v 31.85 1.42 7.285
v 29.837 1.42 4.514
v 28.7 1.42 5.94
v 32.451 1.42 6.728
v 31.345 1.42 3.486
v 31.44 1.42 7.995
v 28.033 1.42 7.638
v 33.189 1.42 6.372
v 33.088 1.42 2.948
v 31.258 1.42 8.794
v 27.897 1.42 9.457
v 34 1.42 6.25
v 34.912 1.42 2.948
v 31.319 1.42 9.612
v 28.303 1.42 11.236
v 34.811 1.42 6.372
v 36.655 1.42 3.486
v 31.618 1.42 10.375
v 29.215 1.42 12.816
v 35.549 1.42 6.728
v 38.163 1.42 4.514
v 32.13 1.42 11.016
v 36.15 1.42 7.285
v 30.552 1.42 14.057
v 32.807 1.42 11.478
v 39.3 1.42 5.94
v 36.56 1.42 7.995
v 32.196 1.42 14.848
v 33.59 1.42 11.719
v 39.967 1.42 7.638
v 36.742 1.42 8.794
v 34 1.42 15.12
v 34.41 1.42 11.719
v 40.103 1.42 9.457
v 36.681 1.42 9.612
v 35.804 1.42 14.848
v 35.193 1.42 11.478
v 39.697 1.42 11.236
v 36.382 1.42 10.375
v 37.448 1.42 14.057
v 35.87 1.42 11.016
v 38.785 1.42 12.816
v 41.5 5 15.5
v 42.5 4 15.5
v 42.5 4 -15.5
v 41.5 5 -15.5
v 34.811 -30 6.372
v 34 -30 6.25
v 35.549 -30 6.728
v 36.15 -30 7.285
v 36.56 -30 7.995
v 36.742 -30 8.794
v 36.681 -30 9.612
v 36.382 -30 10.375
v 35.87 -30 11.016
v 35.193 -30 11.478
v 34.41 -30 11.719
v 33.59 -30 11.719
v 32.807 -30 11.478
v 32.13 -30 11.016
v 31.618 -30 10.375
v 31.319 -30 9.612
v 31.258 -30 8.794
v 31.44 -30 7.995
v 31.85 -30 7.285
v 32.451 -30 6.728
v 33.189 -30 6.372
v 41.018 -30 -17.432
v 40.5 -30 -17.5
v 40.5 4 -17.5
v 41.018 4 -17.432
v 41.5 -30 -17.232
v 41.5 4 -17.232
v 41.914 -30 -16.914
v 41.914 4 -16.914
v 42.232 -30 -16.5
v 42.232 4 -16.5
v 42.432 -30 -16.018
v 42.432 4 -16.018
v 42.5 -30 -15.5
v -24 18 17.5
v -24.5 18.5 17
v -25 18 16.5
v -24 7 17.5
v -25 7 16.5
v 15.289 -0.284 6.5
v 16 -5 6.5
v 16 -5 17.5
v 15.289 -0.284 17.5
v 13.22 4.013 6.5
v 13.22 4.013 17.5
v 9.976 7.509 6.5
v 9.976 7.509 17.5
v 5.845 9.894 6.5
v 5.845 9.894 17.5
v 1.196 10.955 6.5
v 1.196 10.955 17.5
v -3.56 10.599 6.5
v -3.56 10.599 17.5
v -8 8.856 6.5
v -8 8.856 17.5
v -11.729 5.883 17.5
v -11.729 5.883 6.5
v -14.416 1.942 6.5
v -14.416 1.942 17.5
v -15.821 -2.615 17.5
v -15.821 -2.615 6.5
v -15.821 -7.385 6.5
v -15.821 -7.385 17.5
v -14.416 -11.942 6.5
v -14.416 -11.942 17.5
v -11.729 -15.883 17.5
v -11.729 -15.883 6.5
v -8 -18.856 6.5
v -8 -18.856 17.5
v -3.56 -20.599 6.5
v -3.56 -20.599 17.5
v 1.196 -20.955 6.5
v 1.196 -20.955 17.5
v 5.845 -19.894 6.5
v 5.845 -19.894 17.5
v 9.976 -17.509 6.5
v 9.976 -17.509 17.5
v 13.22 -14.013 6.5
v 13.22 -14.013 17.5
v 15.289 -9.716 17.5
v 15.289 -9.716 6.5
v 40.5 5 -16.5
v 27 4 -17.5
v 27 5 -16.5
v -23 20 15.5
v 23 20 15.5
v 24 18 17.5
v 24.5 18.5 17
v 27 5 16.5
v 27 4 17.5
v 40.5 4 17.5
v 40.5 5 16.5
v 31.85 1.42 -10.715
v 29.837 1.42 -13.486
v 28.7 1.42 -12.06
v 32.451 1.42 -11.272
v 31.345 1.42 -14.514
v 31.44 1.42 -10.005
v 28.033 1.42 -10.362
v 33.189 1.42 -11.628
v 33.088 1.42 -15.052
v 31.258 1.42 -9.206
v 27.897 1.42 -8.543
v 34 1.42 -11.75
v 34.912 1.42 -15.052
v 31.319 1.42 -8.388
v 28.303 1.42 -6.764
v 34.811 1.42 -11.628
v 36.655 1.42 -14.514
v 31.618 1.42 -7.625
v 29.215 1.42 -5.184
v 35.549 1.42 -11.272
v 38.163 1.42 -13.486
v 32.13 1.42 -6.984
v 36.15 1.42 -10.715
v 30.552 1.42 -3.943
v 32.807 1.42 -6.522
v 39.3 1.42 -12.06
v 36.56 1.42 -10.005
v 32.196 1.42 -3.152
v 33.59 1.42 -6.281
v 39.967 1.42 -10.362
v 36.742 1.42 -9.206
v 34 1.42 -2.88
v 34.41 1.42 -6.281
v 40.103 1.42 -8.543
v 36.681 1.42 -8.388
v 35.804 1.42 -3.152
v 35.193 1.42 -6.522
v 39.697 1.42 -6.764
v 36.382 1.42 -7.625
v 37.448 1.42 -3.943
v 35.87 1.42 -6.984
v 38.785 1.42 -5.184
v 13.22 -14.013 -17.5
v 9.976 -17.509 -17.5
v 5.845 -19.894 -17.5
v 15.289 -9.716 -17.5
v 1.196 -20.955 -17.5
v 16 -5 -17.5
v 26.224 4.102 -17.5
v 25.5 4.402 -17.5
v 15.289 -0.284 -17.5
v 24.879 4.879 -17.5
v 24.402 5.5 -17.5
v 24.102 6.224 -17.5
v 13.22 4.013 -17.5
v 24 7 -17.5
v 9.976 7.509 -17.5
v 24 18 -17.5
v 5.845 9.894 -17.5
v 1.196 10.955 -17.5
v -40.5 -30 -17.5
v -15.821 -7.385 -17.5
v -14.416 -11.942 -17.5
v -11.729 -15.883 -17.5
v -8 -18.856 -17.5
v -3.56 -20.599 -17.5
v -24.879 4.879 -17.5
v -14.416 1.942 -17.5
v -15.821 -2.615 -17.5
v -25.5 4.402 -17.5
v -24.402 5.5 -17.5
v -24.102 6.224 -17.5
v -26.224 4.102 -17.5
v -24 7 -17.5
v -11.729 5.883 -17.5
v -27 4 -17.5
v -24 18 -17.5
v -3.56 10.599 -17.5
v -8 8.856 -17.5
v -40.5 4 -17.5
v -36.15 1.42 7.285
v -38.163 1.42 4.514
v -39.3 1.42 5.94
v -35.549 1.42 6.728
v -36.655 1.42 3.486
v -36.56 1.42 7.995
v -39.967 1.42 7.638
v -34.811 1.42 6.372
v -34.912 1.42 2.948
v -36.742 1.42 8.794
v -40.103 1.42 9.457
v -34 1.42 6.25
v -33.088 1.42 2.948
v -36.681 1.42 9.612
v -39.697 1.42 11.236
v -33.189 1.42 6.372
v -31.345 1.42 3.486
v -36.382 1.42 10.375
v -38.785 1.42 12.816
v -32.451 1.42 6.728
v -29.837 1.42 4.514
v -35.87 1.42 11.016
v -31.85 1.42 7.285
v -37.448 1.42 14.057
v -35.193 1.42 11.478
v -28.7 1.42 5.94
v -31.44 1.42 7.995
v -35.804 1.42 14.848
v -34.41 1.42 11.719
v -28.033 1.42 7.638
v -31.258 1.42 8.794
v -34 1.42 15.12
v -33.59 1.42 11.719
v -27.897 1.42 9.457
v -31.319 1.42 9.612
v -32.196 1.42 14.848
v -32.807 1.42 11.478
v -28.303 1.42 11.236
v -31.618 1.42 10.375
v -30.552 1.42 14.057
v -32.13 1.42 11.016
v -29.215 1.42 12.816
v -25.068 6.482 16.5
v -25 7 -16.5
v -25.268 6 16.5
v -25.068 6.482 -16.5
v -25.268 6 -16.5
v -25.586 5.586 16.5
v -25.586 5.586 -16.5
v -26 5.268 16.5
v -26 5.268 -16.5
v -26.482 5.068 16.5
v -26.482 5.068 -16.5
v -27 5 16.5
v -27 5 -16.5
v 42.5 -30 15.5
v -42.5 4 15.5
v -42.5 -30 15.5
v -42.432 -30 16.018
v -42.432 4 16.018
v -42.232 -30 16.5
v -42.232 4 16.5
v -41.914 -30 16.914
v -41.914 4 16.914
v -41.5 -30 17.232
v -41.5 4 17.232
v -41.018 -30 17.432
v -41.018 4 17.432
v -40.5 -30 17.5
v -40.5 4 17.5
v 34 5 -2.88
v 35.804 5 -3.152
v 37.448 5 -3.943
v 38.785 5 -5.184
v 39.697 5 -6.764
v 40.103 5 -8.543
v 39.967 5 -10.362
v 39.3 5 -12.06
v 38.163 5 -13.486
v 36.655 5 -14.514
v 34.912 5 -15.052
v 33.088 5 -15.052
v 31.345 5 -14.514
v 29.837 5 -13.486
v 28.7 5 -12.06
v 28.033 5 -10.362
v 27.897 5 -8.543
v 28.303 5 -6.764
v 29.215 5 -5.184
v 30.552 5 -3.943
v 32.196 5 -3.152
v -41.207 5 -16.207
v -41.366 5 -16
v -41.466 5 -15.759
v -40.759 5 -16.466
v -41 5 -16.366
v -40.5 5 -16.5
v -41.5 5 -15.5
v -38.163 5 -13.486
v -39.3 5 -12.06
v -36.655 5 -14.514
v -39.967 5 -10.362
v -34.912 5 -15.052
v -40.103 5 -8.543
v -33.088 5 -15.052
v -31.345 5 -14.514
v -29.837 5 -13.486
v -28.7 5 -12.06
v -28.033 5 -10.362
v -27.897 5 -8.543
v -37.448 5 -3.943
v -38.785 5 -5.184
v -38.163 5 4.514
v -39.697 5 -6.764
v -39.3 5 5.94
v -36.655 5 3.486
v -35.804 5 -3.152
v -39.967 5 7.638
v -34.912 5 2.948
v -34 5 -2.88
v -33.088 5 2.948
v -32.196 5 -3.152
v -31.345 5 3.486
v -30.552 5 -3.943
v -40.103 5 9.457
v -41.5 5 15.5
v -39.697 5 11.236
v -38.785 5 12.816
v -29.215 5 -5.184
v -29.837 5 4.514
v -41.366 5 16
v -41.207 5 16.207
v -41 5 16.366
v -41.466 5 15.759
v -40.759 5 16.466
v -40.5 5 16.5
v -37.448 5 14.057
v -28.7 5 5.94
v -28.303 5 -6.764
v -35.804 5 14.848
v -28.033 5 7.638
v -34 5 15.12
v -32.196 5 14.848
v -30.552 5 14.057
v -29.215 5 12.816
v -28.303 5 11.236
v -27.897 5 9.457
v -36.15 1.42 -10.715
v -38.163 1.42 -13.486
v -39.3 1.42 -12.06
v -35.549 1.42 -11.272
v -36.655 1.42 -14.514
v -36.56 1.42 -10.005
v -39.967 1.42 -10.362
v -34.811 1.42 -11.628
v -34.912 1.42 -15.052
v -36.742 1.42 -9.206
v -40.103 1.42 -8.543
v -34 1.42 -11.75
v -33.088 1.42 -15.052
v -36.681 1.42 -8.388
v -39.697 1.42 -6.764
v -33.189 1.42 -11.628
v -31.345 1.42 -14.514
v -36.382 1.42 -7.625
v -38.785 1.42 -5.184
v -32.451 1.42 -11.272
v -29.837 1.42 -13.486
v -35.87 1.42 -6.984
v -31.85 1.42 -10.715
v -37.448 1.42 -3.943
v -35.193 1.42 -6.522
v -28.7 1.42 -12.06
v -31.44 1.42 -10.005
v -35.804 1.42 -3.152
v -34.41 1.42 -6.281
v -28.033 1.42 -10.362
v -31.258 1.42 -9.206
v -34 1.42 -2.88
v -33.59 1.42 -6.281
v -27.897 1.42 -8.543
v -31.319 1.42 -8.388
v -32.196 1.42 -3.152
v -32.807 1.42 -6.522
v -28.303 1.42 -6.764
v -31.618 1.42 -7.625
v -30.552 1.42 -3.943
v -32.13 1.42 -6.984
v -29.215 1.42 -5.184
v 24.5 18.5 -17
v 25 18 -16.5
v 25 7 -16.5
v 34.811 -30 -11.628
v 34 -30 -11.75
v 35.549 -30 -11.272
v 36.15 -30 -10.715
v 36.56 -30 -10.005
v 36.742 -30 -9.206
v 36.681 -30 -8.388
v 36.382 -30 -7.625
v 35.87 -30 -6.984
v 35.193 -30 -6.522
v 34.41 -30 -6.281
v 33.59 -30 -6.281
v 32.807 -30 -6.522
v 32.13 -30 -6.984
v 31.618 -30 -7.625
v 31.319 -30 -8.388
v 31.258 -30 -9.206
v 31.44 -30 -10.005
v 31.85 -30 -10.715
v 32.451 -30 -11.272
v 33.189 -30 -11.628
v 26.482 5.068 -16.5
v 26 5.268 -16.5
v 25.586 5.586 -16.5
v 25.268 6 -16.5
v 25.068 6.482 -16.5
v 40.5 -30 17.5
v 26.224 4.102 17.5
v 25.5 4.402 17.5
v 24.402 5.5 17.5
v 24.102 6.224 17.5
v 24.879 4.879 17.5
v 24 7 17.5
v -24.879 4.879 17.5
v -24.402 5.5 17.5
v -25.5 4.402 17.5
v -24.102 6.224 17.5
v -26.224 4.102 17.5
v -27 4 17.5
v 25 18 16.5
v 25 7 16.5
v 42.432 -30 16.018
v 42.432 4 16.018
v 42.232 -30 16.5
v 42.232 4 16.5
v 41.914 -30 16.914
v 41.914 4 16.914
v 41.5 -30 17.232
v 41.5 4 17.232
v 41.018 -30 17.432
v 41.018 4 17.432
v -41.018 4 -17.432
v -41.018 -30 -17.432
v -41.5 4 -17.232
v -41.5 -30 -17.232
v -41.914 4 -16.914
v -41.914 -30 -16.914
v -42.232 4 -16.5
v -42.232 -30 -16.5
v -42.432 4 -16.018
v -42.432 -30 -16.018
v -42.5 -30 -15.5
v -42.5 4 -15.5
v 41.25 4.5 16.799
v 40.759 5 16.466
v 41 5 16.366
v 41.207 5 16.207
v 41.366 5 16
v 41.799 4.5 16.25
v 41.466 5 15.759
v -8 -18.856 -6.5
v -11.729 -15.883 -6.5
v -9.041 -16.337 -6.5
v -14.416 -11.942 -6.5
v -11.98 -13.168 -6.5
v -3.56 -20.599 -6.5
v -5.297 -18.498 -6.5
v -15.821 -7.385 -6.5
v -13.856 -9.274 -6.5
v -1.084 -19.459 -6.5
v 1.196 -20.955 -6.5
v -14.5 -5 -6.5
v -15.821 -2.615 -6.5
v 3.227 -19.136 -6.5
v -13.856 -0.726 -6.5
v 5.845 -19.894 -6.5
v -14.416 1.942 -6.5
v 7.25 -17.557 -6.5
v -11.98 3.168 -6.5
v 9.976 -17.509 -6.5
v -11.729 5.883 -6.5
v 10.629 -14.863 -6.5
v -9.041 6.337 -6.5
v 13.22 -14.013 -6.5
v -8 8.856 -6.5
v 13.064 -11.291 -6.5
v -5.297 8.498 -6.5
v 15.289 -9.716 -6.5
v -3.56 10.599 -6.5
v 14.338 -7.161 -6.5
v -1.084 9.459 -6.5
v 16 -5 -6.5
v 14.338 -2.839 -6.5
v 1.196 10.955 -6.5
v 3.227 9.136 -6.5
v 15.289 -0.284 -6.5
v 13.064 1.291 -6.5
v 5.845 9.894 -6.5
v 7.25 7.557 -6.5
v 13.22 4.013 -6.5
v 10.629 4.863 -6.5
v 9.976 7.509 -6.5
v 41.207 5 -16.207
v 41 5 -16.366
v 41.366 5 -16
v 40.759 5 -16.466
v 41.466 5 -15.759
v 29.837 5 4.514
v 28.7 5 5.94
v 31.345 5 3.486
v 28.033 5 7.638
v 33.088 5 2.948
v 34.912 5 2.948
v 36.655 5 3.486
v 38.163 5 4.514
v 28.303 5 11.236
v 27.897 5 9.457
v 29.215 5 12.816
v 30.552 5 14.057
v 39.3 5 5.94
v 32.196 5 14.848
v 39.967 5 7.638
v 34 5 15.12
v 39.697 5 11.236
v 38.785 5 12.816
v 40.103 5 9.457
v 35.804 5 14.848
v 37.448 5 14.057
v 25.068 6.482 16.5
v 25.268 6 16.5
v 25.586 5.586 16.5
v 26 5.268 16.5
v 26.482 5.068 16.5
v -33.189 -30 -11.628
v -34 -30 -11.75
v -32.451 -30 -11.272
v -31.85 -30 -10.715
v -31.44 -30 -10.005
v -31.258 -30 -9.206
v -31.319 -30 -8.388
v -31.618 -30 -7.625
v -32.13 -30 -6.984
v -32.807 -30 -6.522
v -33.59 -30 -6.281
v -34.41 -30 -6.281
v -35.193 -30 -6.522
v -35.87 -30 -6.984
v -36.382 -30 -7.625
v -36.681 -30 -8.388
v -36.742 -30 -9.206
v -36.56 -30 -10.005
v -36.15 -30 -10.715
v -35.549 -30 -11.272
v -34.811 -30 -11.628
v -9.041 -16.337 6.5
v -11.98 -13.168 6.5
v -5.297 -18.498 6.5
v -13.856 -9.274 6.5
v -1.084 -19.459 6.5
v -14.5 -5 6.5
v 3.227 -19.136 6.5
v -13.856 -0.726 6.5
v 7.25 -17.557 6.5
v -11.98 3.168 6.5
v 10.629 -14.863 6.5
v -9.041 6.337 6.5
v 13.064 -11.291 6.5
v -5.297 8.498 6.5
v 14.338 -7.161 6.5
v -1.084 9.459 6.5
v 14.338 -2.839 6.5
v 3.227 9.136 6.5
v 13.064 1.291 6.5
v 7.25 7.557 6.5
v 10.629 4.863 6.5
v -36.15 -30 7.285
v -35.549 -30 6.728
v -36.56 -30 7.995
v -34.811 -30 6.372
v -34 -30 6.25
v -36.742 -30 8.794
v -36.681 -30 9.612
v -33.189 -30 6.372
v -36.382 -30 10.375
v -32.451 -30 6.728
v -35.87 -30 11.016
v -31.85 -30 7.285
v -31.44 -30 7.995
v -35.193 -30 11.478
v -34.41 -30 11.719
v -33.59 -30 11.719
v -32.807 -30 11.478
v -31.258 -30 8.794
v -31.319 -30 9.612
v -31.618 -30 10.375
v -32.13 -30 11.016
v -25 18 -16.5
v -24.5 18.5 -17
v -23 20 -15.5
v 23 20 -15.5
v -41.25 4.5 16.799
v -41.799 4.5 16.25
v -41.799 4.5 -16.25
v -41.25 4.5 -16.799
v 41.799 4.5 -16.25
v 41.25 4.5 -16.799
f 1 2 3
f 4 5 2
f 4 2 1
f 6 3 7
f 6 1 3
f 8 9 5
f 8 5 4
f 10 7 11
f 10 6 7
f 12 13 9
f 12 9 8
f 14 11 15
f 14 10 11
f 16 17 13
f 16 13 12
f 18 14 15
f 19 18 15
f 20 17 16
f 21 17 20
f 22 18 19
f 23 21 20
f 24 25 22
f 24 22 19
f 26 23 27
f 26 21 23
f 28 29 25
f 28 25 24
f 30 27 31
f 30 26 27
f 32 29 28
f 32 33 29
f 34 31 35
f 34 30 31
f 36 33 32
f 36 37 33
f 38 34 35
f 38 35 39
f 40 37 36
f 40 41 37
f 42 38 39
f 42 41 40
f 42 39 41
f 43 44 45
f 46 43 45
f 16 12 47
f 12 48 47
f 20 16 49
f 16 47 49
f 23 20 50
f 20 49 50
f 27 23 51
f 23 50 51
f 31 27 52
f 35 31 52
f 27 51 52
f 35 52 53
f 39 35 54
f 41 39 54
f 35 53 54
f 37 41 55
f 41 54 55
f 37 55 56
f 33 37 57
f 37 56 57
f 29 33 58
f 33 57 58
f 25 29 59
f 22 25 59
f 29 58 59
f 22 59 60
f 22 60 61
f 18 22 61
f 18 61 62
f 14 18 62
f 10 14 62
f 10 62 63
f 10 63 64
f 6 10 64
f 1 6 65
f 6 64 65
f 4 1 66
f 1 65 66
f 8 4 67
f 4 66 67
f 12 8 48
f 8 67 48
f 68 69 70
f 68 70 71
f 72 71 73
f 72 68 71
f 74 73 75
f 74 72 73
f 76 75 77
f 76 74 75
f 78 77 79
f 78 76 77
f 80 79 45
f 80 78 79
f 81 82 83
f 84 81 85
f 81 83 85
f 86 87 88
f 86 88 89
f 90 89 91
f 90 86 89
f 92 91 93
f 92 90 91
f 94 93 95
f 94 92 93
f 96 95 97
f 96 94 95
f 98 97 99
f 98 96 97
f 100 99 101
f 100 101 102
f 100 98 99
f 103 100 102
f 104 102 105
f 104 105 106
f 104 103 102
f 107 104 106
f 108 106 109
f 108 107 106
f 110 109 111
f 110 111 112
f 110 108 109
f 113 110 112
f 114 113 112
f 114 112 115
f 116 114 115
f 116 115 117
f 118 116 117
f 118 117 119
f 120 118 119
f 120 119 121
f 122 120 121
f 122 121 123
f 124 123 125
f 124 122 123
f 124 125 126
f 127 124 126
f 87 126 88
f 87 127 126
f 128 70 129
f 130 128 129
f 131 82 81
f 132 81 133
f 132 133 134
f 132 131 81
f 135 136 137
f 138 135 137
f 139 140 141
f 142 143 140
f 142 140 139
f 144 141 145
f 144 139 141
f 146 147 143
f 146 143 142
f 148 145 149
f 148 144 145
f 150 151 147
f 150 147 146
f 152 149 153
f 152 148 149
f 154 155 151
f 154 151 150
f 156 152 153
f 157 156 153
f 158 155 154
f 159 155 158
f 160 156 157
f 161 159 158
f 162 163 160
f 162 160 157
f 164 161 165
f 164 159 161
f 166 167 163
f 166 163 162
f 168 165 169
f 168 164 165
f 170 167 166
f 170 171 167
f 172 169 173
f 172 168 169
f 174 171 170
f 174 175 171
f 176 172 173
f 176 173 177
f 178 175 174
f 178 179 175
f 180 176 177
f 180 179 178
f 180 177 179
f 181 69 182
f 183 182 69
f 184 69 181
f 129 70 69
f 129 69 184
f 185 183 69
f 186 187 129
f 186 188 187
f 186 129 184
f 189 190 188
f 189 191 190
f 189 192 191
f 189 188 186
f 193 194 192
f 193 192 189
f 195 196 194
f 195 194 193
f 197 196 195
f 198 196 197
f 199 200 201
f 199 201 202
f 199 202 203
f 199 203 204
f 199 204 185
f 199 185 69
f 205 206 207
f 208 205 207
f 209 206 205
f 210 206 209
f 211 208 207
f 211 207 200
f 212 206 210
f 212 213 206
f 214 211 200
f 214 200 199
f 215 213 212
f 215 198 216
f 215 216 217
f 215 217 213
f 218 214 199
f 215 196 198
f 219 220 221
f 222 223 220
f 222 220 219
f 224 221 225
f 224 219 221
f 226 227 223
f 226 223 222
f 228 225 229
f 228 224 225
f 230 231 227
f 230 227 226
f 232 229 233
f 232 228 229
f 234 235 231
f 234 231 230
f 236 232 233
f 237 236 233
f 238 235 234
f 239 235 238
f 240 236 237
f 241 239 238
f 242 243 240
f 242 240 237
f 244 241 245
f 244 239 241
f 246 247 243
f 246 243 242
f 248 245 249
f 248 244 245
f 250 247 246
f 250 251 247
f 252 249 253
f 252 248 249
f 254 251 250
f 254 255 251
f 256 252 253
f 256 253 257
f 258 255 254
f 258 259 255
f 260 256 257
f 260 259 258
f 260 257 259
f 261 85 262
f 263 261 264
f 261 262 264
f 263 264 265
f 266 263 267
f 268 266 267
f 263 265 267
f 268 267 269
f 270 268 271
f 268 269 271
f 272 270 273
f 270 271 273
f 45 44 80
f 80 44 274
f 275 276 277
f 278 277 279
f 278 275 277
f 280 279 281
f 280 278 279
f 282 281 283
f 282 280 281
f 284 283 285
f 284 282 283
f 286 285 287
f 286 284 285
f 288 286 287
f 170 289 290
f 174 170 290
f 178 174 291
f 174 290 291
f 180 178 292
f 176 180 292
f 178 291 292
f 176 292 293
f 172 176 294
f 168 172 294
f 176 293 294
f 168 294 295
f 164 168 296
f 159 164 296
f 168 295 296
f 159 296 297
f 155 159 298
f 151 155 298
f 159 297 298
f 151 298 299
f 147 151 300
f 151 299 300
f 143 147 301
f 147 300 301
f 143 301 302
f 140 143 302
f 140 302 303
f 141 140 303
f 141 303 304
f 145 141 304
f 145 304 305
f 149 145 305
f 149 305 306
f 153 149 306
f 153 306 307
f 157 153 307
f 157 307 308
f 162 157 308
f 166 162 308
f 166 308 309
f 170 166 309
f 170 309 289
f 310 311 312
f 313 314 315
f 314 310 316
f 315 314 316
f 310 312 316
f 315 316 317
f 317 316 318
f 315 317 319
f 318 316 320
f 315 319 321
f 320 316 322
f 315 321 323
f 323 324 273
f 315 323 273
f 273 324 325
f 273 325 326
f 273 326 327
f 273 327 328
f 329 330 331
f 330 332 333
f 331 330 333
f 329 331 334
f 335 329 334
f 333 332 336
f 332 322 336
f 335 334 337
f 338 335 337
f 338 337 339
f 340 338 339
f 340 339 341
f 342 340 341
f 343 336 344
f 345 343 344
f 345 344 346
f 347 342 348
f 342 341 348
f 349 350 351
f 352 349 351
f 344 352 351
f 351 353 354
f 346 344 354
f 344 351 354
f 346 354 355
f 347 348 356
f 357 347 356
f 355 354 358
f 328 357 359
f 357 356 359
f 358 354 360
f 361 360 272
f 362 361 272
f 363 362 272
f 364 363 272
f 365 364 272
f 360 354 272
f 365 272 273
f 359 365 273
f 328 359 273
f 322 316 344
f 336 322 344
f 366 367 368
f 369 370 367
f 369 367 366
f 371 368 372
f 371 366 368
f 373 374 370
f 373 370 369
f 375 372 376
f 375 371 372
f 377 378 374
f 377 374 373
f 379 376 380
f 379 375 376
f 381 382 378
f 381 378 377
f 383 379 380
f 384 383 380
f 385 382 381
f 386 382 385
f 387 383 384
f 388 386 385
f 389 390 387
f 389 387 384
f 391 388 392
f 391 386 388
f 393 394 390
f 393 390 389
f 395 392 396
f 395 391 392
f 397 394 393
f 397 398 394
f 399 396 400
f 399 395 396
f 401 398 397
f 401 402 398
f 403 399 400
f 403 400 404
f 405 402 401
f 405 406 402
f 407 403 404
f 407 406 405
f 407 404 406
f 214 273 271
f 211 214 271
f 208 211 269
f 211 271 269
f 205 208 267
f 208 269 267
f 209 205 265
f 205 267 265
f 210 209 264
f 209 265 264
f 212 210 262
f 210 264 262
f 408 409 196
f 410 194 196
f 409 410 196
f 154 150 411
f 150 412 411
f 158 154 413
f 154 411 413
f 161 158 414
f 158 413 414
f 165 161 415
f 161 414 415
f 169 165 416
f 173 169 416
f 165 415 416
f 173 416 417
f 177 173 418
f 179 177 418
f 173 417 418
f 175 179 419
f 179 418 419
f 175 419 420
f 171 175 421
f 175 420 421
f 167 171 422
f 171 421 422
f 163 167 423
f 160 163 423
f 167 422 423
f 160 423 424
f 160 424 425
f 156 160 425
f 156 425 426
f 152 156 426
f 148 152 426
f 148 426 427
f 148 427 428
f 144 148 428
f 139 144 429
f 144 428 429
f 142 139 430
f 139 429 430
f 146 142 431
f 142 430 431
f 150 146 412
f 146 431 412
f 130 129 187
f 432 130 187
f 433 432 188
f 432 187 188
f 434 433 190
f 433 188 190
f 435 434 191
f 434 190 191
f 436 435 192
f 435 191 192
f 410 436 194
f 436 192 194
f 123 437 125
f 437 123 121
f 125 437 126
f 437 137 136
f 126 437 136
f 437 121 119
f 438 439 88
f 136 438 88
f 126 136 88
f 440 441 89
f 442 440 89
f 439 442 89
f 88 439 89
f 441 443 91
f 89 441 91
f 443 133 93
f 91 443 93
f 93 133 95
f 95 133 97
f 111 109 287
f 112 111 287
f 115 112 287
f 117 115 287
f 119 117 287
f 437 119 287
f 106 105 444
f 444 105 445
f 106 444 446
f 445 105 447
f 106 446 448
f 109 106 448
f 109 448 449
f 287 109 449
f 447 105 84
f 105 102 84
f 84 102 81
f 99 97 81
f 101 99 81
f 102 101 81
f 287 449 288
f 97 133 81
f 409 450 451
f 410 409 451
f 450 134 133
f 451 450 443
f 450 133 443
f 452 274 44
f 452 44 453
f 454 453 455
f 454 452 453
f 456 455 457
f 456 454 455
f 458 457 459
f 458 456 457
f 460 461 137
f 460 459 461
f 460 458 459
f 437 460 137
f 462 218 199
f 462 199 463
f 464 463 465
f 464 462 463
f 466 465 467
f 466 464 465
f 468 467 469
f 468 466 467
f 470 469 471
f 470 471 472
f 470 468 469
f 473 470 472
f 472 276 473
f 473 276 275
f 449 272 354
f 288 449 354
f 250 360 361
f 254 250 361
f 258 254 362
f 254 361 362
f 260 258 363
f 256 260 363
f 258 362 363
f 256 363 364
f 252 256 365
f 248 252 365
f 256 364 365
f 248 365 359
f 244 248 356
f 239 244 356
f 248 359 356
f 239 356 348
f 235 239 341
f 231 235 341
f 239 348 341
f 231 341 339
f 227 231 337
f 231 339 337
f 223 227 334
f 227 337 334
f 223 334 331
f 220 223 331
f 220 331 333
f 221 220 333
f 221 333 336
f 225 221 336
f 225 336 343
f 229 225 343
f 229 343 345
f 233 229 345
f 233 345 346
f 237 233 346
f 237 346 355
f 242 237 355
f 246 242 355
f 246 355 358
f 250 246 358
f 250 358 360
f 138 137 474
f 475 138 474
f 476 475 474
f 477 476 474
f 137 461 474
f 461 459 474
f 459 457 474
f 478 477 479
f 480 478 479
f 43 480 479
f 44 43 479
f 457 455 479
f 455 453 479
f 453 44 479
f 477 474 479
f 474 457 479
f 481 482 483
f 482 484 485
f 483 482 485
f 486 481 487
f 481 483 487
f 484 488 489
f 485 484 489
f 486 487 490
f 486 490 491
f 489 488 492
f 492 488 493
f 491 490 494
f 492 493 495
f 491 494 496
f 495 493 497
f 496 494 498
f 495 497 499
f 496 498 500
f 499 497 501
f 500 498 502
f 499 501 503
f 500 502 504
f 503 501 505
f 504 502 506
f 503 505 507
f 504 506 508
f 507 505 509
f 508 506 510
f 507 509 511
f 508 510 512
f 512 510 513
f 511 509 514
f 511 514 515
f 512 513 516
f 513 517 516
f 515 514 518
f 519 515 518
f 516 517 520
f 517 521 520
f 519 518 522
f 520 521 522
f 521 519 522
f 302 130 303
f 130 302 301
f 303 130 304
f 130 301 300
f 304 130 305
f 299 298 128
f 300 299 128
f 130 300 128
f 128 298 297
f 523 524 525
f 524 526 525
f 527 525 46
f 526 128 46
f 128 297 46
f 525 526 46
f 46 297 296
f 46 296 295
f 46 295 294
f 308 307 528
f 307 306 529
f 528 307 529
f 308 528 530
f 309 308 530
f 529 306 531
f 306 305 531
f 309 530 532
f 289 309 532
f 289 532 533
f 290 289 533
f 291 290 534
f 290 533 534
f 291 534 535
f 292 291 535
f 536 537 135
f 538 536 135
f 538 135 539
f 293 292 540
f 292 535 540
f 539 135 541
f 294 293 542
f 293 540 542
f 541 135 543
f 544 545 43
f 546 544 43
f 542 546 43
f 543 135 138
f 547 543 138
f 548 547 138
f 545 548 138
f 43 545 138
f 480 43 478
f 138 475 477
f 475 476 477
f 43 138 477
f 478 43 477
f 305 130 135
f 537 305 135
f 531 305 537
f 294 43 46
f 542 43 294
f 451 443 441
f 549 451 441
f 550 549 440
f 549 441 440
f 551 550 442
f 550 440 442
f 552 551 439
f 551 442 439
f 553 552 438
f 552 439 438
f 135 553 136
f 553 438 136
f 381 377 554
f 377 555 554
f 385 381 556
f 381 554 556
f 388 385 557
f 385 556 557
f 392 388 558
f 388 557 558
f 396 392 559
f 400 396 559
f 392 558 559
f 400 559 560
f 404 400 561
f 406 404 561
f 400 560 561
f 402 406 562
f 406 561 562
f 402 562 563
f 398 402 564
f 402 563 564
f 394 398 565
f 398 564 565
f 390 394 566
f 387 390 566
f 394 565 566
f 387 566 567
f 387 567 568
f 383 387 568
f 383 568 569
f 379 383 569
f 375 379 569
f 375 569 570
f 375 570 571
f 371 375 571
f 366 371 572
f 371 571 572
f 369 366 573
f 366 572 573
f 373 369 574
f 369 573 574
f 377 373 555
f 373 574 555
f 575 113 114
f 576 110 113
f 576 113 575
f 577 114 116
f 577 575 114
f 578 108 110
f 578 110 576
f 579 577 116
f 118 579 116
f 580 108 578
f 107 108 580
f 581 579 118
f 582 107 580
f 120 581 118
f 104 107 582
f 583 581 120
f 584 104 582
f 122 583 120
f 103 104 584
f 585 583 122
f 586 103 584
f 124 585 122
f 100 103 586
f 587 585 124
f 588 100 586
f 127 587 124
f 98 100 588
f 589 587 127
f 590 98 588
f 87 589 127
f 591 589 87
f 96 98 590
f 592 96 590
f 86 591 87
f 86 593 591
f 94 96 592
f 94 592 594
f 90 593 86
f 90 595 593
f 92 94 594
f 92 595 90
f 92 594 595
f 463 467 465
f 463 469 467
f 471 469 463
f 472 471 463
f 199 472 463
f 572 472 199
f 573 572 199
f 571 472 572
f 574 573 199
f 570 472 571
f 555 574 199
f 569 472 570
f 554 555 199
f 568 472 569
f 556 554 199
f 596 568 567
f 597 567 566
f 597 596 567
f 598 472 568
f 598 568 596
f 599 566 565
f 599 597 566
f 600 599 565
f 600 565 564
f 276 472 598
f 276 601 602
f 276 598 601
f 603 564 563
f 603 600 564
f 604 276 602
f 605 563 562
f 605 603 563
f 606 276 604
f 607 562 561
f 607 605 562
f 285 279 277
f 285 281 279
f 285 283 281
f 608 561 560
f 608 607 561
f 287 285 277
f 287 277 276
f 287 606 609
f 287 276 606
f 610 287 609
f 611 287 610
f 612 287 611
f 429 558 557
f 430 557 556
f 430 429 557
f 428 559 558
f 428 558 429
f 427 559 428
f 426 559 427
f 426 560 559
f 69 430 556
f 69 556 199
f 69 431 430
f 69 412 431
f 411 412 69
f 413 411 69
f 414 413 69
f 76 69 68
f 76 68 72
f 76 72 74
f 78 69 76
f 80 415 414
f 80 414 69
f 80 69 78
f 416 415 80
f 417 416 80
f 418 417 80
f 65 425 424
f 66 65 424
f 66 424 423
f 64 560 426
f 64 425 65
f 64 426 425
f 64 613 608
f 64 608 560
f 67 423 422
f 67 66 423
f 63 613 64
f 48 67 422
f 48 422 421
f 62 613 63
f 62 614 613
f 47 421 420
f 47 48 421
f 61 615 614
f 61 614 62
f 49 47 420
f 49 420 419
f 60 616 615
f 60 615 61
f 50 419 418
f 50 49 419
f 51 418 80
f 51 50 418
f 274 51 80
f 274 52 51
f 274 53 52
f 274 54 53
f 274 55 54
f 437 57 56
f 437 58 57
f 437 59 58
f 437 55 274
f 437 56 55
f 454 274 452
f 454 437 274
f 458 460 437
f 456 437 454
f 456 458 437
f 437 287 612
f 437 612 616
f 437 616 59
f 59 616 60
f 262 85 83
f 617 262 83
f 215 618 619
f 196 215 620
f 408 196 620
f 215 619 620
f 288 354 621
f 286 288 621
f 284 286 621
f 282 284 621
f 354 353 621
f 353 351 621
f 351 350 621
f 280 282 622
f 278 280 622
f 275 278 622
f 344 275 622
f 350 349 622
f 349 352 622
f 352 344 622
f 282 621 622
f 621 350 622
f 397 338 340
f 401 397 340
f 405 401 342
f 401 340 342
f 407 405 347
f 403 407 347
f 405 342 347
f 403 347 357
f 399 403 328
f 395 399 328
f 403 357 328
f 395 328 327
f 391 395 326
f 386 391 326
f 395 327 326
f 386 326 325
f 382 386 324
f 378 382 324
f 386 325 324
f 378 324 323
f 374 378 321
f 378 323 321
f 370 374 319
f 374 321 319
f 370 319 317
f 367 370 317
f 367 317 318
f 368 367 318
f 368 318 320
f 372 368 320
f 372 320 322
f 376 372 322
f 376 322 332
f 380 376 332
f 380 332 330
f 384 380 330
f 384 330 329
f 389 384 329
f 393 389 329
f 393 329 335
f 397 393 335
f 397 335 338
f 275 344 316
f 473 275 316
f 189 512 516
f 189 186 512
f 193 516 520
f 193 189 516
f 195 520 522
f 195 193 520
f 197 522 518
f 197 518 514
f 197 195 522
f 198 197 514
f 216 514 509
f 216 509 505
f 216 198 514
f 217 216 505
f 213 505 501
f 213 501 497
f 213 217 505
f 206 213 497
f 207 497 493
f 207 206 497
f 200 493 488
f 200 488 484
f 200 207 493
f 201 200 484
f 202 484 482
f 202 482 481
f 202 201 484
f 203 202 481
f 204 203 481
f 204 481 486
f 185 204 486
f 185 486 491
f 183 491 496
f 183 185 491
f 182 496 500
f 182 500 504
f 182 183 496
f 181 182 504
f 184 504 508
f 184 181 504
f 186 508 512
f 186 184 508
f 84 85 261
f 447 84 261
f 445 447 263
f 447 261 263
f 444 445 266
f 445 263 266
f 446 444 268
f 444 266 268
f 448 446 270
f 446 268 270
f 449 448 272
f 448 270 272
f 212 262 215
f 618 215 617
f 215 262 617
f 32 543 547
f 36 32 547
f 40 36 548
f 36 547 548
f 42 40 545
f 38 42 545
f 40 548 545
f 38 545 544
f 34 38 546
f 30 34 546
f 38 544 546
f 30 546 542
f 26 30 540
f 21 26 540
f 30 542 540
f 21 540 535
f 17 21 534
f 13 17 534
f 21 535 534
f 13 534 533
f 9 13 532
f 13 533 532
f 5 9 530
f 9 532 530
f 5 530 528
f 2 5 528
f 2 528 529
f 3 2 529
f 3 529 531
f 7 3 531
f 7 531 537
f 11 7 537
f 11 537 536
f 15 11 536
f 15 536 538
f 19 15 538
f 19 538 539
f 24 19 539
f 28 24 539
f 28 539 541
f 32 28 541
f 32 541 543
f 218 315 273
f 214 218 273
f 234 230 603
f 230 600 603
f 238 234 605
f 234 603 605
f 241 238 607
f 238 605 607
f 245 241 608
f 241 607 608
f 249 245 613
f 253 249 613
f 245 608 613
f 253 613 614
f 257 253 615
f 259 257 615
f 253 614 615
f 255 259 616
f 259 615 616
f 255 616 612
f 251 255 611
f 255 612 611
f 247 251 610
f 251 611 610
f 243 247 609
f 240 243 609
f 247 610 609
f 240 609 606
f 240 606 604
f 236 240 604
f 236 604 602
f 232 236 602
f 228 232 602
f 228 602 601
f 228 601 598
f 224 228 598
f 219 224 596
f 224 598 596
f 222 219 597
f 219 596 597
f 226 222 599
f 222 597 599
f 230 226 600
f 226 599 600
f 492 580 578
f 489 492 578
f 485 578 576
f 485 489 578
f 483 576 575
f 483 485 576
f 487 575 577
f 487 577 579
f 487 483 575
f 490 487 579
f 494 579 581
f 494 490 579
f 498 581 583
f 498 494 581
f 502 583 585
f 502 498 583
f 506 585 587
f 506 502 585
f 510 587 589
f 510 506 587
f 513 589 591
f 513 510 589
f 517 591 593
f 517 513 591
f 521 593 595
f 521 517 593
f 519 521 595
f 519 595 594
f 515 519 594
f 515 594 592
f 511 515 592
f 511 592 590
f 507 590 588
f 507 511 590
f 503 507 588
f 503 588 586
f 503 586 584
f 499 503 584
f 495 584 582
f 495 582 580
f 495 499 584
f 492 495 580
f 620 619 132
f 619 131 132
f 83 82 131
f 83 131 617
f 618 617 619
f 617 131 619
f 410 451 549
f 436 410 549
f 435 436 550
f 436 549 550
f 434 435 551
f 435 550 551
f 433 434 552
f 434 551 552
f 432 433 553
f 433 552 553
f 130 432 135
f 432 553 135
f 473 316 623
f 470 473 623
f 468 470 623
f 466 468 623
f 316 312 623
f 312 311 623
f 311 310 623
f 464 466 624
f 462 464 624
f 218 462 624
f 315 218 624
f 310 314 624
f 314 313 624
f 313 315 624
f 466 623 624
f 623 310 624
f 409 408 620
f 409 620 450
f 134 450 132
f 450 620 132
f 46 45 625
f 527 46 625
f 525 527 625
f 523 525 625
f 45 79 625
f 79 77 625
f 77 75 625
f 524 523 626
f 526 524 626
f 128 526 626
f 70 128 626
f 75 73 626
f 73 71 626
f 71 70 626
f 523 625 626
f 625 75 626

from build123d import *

# Parameters (mm, degrees)
SKETCH1_R                               = 16
BOSS_EXTRUDE1_DEPTH                     = 17.5
SKETCH2_R                               = 16
SKETCH2_R_2                             = 14.5
BOSS_EXTRUDE2_DEPTH                     = 6.5
SKETCH3_R                               = 2.6
CUT_EXTRUDE1_DEPTH                      = 58.771100041
CBORE_FOR_M5_HEX_HEAD_BOLT1_D           = 5.5
CBORE_FOR_M5_HEX_HEAD_BOLT1_CBORE_D     = 12.24
CBORE_FOR_M5_HEX_HEAD_BOLT1_CBORE_DEPTH = 3.58
CHAMFER1_SIZE                           = 2
FILLET1_R                               = 2
CHAMFER2_SIZE                           = 1


with BuildPart() as part:
    # Sketch1 → Boss-Extrude1 (new, symmetric)
    with BuildSketch(Plane.XY):
        Polygon((-25, -30), (-42.5, -30), (-42.5, 5), (-25, 5), (-25, 20), (25, 20), (25, 5), (42.5, 5), (42.5, -30), (25, -30), align=None)
        with Locations((0, -5)):
            Circle(SKETCH1_R, mode=Mode.SUBTRACT)
    extrude(amount=BOSS_EXTRUDE1_DEPTH, both=True)

    # Sketch2 → Boss-Extrude2 (add, symmetric)
    with BuildSketch(Plane.XY):
        with Locations((0, -5)):
            Circle(SKETCH2_R)
        with Locations(Location((0, -5, 0), (0, 0, 180))):
            Circle(SKETCH2_R_2, mode=Mode.SUBTRACT)
    extrude(amount=BOSS_EXTRUDE2_DEPTH, both=True)

    # Sketch3 → Cut-Extrude1 (cut, through all)
    with BuildSketch(Plane(origin=(0, 5, 0), x_dir=(1, 0, 0), z_dir=(0, 1, 0))):
        with Locations(Location((-34, 9, 0), (0, 0, 270))):
            Circle(SKETCH3_R)
        with Locations(Location((-34, -9, 0), (0, 0, 90))):
            Circle(SKETCH3_R)
        with Locations(Location((34, 9, 0), (0, 0, 90))):
            Circle(SKETCH3_R)
        with Locations(Location((34, -9, 0), (0, 0, 270))):
            Circle(SKETCH3_R)
    extrude(amount=-CUT_EXTRUDE1_DEPTH, mode=Mode.SUBTRACT)

    # CBORE for M5 Hex Head Bolt1 (through all)
    with Locations(Plane(origin=(-34, 5, -9), x_dir=(0, 0, 1), z_dir=(0, 1, 0))):
        with Locations((0, 0), (18, 0), (18, 68), (0, 68)):
            CounterBoreHole(CBORE_FOR_M5_HEX_HEAD_BOLT1_D / 2, CBORE_FOR_M5_HEX_HEAD_BOLT1_CBORE_D / 2, CBORE_FOR_M5_HEX_HEAD_BOLT1_CBORE_DEPTH)

    # Chamfer1
    chamfer1_edges = [part.edges().sort_by_distance(p)[0] for p in [
        (0, 20, -17.5),
        (-25, 20, 0),
        (25, 20, 0),
        (0, 20, 17.5),
    ]]
    chamfer(chamfer1_edges, length=CHAMFER1_SIZE)

    # Fillet1
    fillet1_edges = [part.edges().sort_by_distance(p)[0] for p in [
        (42.5, -12.5, -17.5),
        (-42.5, -12.5, 17.5),
        (-42.5, -12.5, -17.5),
        (25, 5, 0),
        (-25, 5, 0),
        (42.5, -12.5, 17.5),
    ]]
    fillet(fillet1_edges, radius=FILLET1_R)

    # Chamfer2
    chamfer2_edges = [part.edges().sort_by_distance(p)[0] for p in [
        (-33.75, 5, -17.5),
        (-42.5, 5, 0),
        (-33.75, 5, 17.5),
        (-41.914213562, 5, -16.914213562),
        (-41.914213562, 5, 16.914213562),
        (25, 12.5, 17.5),
        (33.75, 5, 17.5),
        (25, 12.5, -17.5),
        (33.75, 5, -17.5),
        (42.5, 5, 0),
        (41.914213562, 5, -16.914213562),
        (41.914213562, 5, 16.914213562),
        (-25.585786438, 5.585786438, -17.5),
        (-25.585786438, 5.585786438, 17.5),
        (25.585786438, 5.585786438, -17.5),
        (25.585786438, 5.585786438, 17.5),
        (-25, 12.5, 17.5),
        (-25, 12.5, -17.5),
    ]]
    chamfer(chamfer2_edges, length=CHAMFER2_SIZE)


solid = part.part
